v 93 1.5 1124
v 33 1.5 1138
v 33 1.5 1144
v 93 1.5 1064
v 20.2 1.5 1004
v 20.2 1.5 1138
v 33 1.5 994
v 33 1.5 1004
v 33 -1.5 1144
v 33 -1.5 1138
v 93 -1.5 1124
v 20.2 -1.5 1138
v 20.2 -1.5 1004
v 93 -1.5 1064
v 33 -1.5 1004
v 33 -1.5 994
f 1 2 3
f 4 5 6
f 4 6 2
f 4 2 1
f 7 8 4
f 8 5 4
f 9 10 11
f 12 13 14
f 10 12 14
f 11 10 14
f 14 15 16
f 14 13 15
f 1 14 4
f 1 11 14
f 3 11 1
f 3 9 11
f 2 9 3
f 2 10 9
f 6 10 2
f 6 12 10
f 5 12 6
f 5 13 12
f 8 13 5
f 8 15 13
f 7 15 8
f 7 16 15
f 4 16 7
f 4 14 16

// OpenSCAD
// file: ../lib/astra66_core.scad
// =============================================================================
// ASTRA-66 CAD rev B -- core library
// Parameters (generated from analysis.py by build.py), derived stations and helpers.
// Every part file includes this; stations mirror analysis.py X[] exactly.
//
// Frame: rocket axis = +Z, STA 0 = nose tip, stations increase aft.
// Angles: measured about +Z from +X toward +Y.  90 deg = switch / hatch side,
// 270 deg = camera side, 45 deg = rail-button line, fins at 0/90/180/270 deg.
// =============================================================================
include <../astra66_params.scad>

$fn = FN;
EPS = 0.01;
CAD_REV = "B";

// ----------------------------------------------------------------- radii
R_OD    = BODY_OD / 2;                 // body tube outer
R_ID    = BODY_ID / 2;                 // body tube inner
R_SH    = (BODY_ID - FIT_SH) / 2;      // printed shoulder / ring OD radius
R_SI    = R_SH - NC_SH_WALL;           // nose shoulder inner radius
R_CO    = CPL_OD / 2;                  // coupler outer
R_CI    = CPL_ID / 2;                  // coupler inner
R_BH_IN = (CPL_ID - 0.2) / 2;          // inner bulkhead disc (fits in coupler)
R_MO    = MMT_OD / 2;
R_MI    = MMT_ID / 2;
R_RING_BORE = (MMT_OD + FIT_SH) / 2;   // centering-ring / core bore
R_TAB_FLOOR = max(R_MO, RET_CLEAR_D / 2);          // rev B: tab clears the COTS retainer
FIN_TAB_H   = R_OD - R_TAB_FLOOR - FIN_TAB_CLR;

// ----------------------------------------------------------------- stations
X_NC_BASE     = NC_L;
X_SH_END      = NC_L + NC_SH_L;
X_PL_END      = NC_L + PL_L;
X_BAND_END    = X_PL_END + AV_BAND_L;
X_END         = X_BAND_END + BO_L;
L_OVERALL     = X_END;                              // airframe length (excl. COTS retainer)
X_CPL_FWD     = X_PL_END - AV_INS;
X_CPL_AFT     = X_BAND_END + AV_INS;
X_AVB_FWD_OUT = X_CPL_FWD - AV_BH_T;                // AV-303 forward face
X_AVB_AFT_OUT = X_CPL_AFT + GASKET_T;               // AV-304 outer-disc forward face
X_AVB_AFT_END = X_AVB_AFT_OUT + AV_BH_T;            // AV-304 aft face (recovery bay starts)
X_SLED_FWD    = X_CPL_FWD + AV_BH_T + SLED_FWD_GAP;
X_SLED_AFT    = X_SLED_FWD + SLED_L;
X_MMT_AFT     = X_END + MMT_AFT_EXT;
X_MMT_FWD     = X_MMT_AFT - MMT_L;
X_FIN_LE      = X_END - FIN_CR;
X_TAB_FWD     = X_FIN_LE + FIN_TAB_FWD;
X_TAB_AFT     = X_END - LOCK_T;
X_CORE_FWD    = X_TAB_FWD - CORE_RING_T;
X_CORE_AFT    = X_END - LOCK_T;
X_NC_SCREW    = NC_L + NC_SH_L / 2;
X_CAM         = X_SH_END + CAM_OFF;
X_HATCH       = X_SH_END + HATCH_OFF;
X_RB_FWD      = X_MMT_FWD - RB_FWD_OFF;
X_RB_AFT      = X_END - RB_AFT_OFF;
X_TRAY_FWD    = X_AVB_FWD_OUT - TRAY_L;
X_SW          = X_PL_END + AV_BAND_L / 2;
X_MOTOR_FWD   = X_MMT_AFT - MOTOR_L;
X_BAT0        = X_SLED_FWD + 2;
BAT_CAGE_L    = 12 + BAT_L + 0.6;
PAYLOAD_BAY_L  = X_AVB_FWD_OUT - X_SH_END;
RECOVERY_BAY_L = X_MMT_FWD - X_AVB_AFT_END;

FIN_ANGLES      = [for (i = [0 : FIN_N - 1]) i * 360 / FIN_N];
LOCK_SCREW_ANG  = [45, 135, 225, 315];
STATIC_PORT_ANG = [45, 135, 225, 315];

// ----------------------------------------------------------------- geometry helpers
function ogive_rho()  = (R_OD * R_OD + NC_L * NC_L) / (2 * R_OD);
function ogive_r(x)   = sqrt(max(pow(ogive_rho(), 2) - pow(NC_L - x, 2), 0)) + R_OD - ogive_rho();

// Solid of revolution of the tangent ogive between stations x0..x1, radially offset inward by off.
module ogive_solid(x0, x1, off = 0, n = 72) {
    s = (x0 == 0) ? 1 : 0;
    rotate_extrude()
        polygon(concat([[0, x0]],
                       [for (i = [s : n]) let(x = x0 + (x1 - x0) * i / n) [max(ogive_r(x) - off, 0.01), x]],
                       [[0, x1]]));
}

module tube_r(ro, ri, z0, z1) {
    translate([0, 0, z0]) difference() {
        cylinder(r = ro, h = z1 - z0);
        translate([0, 0, -1]) cylinder(r = ri, h = z1 - z0 + 2);
    }
}

module at_angle(a) { rotate([0, 0, a]) children(); }

// Cylinder of diameter d along the radial direction at angle a, from radius r0 to r1, at station z.
module radial_cyl(d, z, a, r0, r1) {
    at_angle(a) translate([r0, 0, z]) rotate([0, 90, 0]) cylinder(d = d, h = r1 - r0);
}

module rounded_rect(l, w, r) { offset(r = r) square([l - 2 * r, w - 2 * r], center = true); }

// Radial prism with a rounded-rectangle footprint (l axial x w tangential) centred at station z.
module radial_prism(a, z, l, w, rr, r0, r1) {
    at_angle(a) translate([r0, 0, z]) rotate([0, 90, 0]) linear_extrude(r1 - r0) rounded_rect(l, w, rr);
}

// Block in the radial frame at angle a: radial r0..r1, tangential +/-hw, stations z0..z1, clipped to radius rc.
module radial_block(a, r0, r1, hw, z0, z1, rc) {
    intersection() {
        at_angle(a) translate([r0, -hw, z0]) cube([r1 - r0, 2 * hw, z1 - z0]);
        translate([0, 0, z0 - 1]) cylinder(r = rc, h = z1 - z0 + 2);
    }
}

// Camera frame: child +Z = lens axis (outward, tilted CAM_TILT aft), origin at the lens face centre.
// Lens-face radius CAM_R0 is the smaller of (a) the tilted barrel rim 0.5 mm inside the bore and
// (b) the tilted camera-body corners 0.5 mm inside the bore -- so any CAM_W/CAM_LEN entered fits.
CAM_SETBACK = CAM_LENS_L * cos(CAM_TILT) + (CAM_LENS_HOLE - 1) / 2 * sin(CAM_TILT) + 0.5;
CAM_R0 = min(R_ID - CAM_SETBACK, sqrt(pow(R_ID - 0.5, 2) - pow(CAM_W / 2, 2)) - CAM_LEN / 2 * sin(CAM_TILT));
module cam_frame() {
    at_angle(CAM_ANG) translate([CAM_R0, 0, X_CAM]) rotate([0, 90 - CAM_TILT, 0]) children();
}

echo(str("ASTRA-66 CAD rev ", CAD_REV, ": L_OVERALL=", L_OVERALL, " payload bay=", PAYLOAD_BAY_L,
         " recovery bay=", RECOVERY_BAY_L, " fin tab depth=", FIN_TAB_H));
// main file
// ASTRA-66 CAD rev B -- BO-406 Fin (qty FIN_N + 1 spare) and fin set
// Trapezoidal fin, root FIN_CR, tip FIN_CT, span FIN_S, LE sweep FIN_XR, thickness FIN_T; slide-in tab
// from X_TAB_FWD to X_TAB_AFT, depth FIN_TAB_H (rev B: clears the COTS retainer, rests on BO-403 floors).
// 3 mm aircraft birch ply. Laser-cut: OUT="2d" gives the flat pattern (root on the X axis, LE at origin).
include <../lib/astra66_core.scad>

OUT = "3d";   // "3d" | "2d"
SUB = "one";  // "one" | "set"

// profile in (radius, station) coordinates
function fin_pts() = [[R_OD, X_FIN_LE], [R_OD + FIN_S, X_FIN_LE + FIN_XR], [R_OD + FIN_S, X_FIN_LE + FIN_XR + FIN_CT],
                      [R_OD, X_END], [R_OD, X_TAB_AFT], [R_OD - FIN_TAB_H, X_TAB_AFT], [R_OD - FIN_TAB_H, X_TAB_FWD],
                      [R_OD, X_TAB_FWD]];

module BO_406_fin_2d_rz() { polygon(fin_pts()); }
module BO_406_fin_flat() { polygon([for (p = fin_pts()) [p[1] - X_FIN_LE, p[0] - R_OD]]); }
module BO_406_fin(a = 0) { at_angle(a) rotate([90, 0, 0]) linear_extrude(height = FIN_T, center = true) BO_406_fin_2d_rz(); }
module BO_406_fin_set() { for (a = FIN_ANGLES) BO_406_fin(a); }

if (OUT == "2d") BO_406_fin_flat();
else if (SUB == "set") BO_406_fin_set();
else BO_406_fin(0);
